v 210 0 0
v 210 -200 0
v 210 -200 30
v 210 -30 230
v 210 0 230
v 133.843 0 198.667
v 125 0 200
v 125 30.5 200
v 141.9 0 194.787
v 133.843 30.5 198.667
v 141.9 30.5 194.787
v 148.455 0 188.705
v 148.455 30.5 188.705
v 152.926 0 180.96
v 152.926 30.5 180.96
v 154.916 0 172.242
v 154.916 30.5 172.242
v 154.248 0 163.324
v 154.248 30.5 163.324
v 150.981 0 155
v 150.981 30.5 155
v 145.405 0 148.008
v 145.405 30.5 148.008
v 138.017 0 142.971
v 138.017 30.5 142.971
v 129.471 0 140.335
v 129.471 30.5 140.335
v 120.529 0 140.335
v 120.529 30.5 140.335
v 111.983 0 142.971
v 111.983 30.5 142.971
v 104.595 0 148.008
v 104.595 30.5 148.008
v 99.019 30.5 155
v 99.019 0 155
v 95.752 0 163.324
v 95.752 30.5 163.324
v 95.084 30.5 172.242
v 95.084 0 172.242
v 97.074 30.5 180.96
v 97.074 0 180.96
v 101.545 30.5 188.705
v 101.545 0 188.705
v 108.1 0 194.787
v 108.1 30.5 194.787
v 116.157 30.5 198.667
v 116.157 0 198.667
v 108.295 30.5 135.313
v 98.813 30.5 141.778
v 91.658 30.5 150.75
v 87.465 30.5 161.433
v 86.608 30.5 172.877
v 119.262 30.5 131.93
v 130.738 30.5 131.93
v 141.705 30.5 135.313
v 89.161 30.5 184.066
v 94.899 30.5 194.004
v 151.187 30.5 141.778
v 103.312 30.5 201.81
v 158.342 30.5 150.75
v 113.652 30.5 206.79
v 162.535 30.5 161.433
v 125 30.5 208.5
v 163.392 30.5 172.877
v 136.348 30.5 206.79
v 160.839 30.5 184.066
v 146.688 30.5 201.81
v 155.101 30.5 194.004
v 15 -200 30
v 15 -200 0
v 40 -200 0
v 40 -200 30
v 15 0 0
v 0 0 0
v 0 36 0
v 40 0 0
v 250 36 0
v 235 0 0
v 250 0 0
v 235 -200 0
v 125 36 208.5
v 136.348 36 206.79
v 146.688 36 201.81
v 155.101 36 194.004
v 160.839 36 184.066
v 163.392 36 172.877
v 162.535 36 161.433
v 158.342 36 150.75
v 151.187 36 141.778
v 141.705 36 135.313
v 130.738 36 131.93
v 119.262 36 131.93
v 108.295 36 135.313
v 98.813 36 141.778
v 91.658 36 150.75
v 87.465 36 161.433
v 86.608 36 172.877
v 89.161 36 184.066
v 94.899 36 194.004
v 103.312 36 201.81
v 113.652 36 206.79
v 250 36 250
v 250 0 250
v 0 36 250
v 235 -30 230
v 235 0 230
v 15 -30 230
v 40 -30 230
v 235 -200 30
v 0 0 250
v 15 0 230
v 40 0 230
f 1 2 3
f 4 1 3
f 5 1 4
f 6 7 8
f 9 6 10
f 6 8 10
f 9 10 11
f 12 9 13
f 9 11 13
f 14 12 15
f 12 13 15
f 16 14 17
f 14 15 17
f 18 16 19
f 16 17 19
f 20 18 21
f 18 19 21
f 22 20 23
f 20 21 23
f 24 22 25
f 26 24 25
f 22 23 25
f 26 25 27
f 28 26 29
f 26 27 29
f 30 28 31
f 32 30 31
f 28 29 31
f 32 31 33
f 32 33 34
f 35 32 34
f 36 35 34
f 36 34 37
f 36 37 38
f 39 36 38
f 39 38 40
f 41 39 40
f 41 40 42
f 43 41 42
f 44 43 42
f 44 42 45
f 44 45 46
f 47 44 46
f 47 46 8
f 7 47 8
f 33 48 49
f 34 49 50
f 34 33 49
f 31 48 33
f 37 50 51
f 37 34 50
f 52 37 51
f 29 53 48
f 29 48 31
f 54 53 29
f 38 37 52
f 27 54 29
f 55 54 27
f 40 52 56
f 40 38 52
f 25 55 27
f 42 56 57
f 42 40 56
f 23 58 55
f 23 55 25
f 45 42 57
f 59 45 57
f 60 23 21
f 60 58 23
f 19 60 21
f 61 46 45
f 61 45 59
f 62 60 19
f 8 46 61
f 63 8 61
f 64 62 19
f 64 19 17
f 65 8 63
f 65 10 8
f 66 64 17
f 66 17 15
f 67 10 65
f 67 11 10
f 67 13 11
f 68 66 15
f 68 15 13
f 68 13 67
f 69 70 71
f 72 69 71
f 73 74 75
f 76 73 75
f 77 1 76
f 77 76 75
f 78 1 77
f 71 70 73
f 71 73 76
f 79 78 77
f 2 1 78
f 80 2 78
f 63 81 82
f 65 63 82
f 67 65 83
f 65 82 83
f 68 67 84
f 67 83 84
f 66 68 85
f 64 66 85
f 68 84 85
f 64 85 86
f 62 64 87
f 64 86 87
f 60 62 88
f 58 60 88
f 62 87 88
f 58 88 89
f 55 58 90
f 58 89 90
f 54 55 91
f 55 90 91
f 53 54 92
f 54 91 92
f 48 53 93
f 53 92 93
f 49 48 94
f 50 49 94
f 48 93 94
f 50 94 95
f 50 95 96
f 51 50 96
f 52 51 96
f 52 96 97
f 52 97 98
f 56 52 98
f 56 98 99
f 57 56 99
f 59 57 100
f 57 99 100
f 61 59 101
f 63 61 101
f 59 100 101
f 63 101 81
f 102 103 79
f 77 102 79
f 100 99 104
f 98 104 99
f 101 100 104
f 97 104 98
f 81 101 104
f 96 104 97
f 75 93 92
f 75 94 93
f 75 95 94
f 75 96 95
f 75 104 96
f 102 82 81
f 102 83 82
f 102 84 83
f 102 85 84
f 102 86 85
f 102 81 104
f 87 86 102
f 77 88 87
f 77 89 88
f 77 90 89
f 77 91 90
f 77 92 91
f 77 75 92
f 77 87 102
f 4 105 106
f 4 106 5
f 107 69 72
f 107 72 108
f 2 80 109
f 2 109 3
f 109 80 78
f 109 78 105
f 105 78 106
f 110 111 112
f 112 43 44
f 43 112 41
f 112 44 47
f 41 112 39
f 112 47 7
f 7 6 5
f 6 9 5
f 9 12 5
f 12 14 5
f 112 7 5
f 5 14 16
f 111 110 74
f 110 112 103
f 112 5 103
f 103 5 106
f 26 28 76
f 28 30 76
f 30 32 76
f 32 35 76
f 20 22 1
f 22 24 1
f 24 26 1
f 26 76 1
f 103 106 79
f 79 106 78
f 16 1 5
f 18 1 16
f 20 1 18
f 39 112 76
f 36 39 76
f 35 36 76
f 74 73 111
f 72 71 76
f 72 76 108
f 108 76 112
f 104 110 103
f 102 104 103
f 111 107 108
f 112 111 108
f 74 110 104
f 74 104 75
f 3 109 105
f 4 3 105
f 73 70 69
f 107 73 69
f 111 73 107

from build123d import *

# Parameters (mm, degrees)
SKETCH_1_W          = 250
SKETCH_1_H          = 250
EXTRUDE_1_DEPTH     = 36
CUT_EXTRUDE_1_REACH = 357.381
SKETCH_2_R          = 30
SKETCH_3_R          = 38.5
CUT_EXTRUDE_2_DEPTH = 5.5
SKETCH_4_W          = 25
SKETCH_4_H          = 230
EXTRUDE_2_DEPTH     = 200
CUT_EXTRUDE_3_REACH = 399.146


with BuildPart() as part:
    # 草图1 → 凸台-拉伸1 (new body)
    with BuildSketch(Plane(origin=(0, 0, 0), x_dir=(1, 0, 0), z_dir=(0, 1, 0))):
        with Locations((125, -125)):
            Rectangle(SKETCH_1_W, SKETCH_1_H)
    extrude(amount=EXTRUDE_1_DEPTH)

    # 草图2 → 切除-拉伸1 (cut, up to next)
    with BuildSketch(Plane(origin=(0, 36, 0), x_dir=(1, 0, 0), z_dir=(0, 1, 0)), mode=Mode.PRIVATE) as cut_extrude_1_sk1:
        with Locations(Location((125, -170, 0), (0, 0, 270))):
            Circle(SKETCH_2_R)
    cut_extrude_1_tool1 = extrude(cut_extrude_1_sk1.sketch, amount=-CUT_EXTRUDE_1_REACH, mode=Mode.PRIVATE) & part.part
    add(cut_extrude_1_tool1.solids().sort_by_distance((125, 36, 170))[0], mode=Mode.SUBTRACT)

    # 草图3 → 切除-拉伸2 (cut)
    with BuildSketch(Plane(origin=(0, 36, 0), x_dir=(1, 0, 0), z_dir=(0, 1, 0))):
        with Locations(Location((125, -170, 0), (0, 0, 270))):
            Circle(SKETCH_3_R)
    extrude(amount=-CUT_EXTRUDE_2_DEPTH, mode=Mode.SUBTRACT)

    # 草图4 → 凸台-拉伸2 (add)
    with BuildSketch(Plane.XZ):
        with Locations((27.5, 115)):
            Rectangle(SKETCH_4_W, SKETCH_4_H)
    extrude_2 = extrude(amount=EXTRUDE_2_DEPTH)

    # 草图5 → 切除-拉伸3 (cut, up to next)
    with BuildSketch(Plane.ZY.offset(-15), mode=Mode.PRIVATE) as cut_extrude_3_sk1:
        Polygon((30, -200), (230, -30), (230, -200), align=None)
    cut_extrude_3_tool1 = extrude(cut_extrude_3_sk1.sketch, amount=-CUT_EXTRUDE_3_REACH, mode=Mode.PRIVATE) & part.part
    cut_extrude_3 = cut_extrude_3_tool1.solids().sort_by_distance((15, -143.333333, 163.333333))[0]
    add(cut_extrude_3, mode=Mode.SUBTRACT)

    # 镜向1: 凸台-拉伸2, 切除-拉伸3 across plane
    add(extrude_2.mirror(Plane(origin=(125, 0, 0), x_dir=(0, 0, 1), z_dir=(1, 0, 0))))
    add(cut_extrude_3.mirror(Plane(origin=(125, 0, 0), x_dir=(0, 0, 1), z_dir=(1, 0, 0))), mode=Mode.SUBTRACT)


solid = part.part
